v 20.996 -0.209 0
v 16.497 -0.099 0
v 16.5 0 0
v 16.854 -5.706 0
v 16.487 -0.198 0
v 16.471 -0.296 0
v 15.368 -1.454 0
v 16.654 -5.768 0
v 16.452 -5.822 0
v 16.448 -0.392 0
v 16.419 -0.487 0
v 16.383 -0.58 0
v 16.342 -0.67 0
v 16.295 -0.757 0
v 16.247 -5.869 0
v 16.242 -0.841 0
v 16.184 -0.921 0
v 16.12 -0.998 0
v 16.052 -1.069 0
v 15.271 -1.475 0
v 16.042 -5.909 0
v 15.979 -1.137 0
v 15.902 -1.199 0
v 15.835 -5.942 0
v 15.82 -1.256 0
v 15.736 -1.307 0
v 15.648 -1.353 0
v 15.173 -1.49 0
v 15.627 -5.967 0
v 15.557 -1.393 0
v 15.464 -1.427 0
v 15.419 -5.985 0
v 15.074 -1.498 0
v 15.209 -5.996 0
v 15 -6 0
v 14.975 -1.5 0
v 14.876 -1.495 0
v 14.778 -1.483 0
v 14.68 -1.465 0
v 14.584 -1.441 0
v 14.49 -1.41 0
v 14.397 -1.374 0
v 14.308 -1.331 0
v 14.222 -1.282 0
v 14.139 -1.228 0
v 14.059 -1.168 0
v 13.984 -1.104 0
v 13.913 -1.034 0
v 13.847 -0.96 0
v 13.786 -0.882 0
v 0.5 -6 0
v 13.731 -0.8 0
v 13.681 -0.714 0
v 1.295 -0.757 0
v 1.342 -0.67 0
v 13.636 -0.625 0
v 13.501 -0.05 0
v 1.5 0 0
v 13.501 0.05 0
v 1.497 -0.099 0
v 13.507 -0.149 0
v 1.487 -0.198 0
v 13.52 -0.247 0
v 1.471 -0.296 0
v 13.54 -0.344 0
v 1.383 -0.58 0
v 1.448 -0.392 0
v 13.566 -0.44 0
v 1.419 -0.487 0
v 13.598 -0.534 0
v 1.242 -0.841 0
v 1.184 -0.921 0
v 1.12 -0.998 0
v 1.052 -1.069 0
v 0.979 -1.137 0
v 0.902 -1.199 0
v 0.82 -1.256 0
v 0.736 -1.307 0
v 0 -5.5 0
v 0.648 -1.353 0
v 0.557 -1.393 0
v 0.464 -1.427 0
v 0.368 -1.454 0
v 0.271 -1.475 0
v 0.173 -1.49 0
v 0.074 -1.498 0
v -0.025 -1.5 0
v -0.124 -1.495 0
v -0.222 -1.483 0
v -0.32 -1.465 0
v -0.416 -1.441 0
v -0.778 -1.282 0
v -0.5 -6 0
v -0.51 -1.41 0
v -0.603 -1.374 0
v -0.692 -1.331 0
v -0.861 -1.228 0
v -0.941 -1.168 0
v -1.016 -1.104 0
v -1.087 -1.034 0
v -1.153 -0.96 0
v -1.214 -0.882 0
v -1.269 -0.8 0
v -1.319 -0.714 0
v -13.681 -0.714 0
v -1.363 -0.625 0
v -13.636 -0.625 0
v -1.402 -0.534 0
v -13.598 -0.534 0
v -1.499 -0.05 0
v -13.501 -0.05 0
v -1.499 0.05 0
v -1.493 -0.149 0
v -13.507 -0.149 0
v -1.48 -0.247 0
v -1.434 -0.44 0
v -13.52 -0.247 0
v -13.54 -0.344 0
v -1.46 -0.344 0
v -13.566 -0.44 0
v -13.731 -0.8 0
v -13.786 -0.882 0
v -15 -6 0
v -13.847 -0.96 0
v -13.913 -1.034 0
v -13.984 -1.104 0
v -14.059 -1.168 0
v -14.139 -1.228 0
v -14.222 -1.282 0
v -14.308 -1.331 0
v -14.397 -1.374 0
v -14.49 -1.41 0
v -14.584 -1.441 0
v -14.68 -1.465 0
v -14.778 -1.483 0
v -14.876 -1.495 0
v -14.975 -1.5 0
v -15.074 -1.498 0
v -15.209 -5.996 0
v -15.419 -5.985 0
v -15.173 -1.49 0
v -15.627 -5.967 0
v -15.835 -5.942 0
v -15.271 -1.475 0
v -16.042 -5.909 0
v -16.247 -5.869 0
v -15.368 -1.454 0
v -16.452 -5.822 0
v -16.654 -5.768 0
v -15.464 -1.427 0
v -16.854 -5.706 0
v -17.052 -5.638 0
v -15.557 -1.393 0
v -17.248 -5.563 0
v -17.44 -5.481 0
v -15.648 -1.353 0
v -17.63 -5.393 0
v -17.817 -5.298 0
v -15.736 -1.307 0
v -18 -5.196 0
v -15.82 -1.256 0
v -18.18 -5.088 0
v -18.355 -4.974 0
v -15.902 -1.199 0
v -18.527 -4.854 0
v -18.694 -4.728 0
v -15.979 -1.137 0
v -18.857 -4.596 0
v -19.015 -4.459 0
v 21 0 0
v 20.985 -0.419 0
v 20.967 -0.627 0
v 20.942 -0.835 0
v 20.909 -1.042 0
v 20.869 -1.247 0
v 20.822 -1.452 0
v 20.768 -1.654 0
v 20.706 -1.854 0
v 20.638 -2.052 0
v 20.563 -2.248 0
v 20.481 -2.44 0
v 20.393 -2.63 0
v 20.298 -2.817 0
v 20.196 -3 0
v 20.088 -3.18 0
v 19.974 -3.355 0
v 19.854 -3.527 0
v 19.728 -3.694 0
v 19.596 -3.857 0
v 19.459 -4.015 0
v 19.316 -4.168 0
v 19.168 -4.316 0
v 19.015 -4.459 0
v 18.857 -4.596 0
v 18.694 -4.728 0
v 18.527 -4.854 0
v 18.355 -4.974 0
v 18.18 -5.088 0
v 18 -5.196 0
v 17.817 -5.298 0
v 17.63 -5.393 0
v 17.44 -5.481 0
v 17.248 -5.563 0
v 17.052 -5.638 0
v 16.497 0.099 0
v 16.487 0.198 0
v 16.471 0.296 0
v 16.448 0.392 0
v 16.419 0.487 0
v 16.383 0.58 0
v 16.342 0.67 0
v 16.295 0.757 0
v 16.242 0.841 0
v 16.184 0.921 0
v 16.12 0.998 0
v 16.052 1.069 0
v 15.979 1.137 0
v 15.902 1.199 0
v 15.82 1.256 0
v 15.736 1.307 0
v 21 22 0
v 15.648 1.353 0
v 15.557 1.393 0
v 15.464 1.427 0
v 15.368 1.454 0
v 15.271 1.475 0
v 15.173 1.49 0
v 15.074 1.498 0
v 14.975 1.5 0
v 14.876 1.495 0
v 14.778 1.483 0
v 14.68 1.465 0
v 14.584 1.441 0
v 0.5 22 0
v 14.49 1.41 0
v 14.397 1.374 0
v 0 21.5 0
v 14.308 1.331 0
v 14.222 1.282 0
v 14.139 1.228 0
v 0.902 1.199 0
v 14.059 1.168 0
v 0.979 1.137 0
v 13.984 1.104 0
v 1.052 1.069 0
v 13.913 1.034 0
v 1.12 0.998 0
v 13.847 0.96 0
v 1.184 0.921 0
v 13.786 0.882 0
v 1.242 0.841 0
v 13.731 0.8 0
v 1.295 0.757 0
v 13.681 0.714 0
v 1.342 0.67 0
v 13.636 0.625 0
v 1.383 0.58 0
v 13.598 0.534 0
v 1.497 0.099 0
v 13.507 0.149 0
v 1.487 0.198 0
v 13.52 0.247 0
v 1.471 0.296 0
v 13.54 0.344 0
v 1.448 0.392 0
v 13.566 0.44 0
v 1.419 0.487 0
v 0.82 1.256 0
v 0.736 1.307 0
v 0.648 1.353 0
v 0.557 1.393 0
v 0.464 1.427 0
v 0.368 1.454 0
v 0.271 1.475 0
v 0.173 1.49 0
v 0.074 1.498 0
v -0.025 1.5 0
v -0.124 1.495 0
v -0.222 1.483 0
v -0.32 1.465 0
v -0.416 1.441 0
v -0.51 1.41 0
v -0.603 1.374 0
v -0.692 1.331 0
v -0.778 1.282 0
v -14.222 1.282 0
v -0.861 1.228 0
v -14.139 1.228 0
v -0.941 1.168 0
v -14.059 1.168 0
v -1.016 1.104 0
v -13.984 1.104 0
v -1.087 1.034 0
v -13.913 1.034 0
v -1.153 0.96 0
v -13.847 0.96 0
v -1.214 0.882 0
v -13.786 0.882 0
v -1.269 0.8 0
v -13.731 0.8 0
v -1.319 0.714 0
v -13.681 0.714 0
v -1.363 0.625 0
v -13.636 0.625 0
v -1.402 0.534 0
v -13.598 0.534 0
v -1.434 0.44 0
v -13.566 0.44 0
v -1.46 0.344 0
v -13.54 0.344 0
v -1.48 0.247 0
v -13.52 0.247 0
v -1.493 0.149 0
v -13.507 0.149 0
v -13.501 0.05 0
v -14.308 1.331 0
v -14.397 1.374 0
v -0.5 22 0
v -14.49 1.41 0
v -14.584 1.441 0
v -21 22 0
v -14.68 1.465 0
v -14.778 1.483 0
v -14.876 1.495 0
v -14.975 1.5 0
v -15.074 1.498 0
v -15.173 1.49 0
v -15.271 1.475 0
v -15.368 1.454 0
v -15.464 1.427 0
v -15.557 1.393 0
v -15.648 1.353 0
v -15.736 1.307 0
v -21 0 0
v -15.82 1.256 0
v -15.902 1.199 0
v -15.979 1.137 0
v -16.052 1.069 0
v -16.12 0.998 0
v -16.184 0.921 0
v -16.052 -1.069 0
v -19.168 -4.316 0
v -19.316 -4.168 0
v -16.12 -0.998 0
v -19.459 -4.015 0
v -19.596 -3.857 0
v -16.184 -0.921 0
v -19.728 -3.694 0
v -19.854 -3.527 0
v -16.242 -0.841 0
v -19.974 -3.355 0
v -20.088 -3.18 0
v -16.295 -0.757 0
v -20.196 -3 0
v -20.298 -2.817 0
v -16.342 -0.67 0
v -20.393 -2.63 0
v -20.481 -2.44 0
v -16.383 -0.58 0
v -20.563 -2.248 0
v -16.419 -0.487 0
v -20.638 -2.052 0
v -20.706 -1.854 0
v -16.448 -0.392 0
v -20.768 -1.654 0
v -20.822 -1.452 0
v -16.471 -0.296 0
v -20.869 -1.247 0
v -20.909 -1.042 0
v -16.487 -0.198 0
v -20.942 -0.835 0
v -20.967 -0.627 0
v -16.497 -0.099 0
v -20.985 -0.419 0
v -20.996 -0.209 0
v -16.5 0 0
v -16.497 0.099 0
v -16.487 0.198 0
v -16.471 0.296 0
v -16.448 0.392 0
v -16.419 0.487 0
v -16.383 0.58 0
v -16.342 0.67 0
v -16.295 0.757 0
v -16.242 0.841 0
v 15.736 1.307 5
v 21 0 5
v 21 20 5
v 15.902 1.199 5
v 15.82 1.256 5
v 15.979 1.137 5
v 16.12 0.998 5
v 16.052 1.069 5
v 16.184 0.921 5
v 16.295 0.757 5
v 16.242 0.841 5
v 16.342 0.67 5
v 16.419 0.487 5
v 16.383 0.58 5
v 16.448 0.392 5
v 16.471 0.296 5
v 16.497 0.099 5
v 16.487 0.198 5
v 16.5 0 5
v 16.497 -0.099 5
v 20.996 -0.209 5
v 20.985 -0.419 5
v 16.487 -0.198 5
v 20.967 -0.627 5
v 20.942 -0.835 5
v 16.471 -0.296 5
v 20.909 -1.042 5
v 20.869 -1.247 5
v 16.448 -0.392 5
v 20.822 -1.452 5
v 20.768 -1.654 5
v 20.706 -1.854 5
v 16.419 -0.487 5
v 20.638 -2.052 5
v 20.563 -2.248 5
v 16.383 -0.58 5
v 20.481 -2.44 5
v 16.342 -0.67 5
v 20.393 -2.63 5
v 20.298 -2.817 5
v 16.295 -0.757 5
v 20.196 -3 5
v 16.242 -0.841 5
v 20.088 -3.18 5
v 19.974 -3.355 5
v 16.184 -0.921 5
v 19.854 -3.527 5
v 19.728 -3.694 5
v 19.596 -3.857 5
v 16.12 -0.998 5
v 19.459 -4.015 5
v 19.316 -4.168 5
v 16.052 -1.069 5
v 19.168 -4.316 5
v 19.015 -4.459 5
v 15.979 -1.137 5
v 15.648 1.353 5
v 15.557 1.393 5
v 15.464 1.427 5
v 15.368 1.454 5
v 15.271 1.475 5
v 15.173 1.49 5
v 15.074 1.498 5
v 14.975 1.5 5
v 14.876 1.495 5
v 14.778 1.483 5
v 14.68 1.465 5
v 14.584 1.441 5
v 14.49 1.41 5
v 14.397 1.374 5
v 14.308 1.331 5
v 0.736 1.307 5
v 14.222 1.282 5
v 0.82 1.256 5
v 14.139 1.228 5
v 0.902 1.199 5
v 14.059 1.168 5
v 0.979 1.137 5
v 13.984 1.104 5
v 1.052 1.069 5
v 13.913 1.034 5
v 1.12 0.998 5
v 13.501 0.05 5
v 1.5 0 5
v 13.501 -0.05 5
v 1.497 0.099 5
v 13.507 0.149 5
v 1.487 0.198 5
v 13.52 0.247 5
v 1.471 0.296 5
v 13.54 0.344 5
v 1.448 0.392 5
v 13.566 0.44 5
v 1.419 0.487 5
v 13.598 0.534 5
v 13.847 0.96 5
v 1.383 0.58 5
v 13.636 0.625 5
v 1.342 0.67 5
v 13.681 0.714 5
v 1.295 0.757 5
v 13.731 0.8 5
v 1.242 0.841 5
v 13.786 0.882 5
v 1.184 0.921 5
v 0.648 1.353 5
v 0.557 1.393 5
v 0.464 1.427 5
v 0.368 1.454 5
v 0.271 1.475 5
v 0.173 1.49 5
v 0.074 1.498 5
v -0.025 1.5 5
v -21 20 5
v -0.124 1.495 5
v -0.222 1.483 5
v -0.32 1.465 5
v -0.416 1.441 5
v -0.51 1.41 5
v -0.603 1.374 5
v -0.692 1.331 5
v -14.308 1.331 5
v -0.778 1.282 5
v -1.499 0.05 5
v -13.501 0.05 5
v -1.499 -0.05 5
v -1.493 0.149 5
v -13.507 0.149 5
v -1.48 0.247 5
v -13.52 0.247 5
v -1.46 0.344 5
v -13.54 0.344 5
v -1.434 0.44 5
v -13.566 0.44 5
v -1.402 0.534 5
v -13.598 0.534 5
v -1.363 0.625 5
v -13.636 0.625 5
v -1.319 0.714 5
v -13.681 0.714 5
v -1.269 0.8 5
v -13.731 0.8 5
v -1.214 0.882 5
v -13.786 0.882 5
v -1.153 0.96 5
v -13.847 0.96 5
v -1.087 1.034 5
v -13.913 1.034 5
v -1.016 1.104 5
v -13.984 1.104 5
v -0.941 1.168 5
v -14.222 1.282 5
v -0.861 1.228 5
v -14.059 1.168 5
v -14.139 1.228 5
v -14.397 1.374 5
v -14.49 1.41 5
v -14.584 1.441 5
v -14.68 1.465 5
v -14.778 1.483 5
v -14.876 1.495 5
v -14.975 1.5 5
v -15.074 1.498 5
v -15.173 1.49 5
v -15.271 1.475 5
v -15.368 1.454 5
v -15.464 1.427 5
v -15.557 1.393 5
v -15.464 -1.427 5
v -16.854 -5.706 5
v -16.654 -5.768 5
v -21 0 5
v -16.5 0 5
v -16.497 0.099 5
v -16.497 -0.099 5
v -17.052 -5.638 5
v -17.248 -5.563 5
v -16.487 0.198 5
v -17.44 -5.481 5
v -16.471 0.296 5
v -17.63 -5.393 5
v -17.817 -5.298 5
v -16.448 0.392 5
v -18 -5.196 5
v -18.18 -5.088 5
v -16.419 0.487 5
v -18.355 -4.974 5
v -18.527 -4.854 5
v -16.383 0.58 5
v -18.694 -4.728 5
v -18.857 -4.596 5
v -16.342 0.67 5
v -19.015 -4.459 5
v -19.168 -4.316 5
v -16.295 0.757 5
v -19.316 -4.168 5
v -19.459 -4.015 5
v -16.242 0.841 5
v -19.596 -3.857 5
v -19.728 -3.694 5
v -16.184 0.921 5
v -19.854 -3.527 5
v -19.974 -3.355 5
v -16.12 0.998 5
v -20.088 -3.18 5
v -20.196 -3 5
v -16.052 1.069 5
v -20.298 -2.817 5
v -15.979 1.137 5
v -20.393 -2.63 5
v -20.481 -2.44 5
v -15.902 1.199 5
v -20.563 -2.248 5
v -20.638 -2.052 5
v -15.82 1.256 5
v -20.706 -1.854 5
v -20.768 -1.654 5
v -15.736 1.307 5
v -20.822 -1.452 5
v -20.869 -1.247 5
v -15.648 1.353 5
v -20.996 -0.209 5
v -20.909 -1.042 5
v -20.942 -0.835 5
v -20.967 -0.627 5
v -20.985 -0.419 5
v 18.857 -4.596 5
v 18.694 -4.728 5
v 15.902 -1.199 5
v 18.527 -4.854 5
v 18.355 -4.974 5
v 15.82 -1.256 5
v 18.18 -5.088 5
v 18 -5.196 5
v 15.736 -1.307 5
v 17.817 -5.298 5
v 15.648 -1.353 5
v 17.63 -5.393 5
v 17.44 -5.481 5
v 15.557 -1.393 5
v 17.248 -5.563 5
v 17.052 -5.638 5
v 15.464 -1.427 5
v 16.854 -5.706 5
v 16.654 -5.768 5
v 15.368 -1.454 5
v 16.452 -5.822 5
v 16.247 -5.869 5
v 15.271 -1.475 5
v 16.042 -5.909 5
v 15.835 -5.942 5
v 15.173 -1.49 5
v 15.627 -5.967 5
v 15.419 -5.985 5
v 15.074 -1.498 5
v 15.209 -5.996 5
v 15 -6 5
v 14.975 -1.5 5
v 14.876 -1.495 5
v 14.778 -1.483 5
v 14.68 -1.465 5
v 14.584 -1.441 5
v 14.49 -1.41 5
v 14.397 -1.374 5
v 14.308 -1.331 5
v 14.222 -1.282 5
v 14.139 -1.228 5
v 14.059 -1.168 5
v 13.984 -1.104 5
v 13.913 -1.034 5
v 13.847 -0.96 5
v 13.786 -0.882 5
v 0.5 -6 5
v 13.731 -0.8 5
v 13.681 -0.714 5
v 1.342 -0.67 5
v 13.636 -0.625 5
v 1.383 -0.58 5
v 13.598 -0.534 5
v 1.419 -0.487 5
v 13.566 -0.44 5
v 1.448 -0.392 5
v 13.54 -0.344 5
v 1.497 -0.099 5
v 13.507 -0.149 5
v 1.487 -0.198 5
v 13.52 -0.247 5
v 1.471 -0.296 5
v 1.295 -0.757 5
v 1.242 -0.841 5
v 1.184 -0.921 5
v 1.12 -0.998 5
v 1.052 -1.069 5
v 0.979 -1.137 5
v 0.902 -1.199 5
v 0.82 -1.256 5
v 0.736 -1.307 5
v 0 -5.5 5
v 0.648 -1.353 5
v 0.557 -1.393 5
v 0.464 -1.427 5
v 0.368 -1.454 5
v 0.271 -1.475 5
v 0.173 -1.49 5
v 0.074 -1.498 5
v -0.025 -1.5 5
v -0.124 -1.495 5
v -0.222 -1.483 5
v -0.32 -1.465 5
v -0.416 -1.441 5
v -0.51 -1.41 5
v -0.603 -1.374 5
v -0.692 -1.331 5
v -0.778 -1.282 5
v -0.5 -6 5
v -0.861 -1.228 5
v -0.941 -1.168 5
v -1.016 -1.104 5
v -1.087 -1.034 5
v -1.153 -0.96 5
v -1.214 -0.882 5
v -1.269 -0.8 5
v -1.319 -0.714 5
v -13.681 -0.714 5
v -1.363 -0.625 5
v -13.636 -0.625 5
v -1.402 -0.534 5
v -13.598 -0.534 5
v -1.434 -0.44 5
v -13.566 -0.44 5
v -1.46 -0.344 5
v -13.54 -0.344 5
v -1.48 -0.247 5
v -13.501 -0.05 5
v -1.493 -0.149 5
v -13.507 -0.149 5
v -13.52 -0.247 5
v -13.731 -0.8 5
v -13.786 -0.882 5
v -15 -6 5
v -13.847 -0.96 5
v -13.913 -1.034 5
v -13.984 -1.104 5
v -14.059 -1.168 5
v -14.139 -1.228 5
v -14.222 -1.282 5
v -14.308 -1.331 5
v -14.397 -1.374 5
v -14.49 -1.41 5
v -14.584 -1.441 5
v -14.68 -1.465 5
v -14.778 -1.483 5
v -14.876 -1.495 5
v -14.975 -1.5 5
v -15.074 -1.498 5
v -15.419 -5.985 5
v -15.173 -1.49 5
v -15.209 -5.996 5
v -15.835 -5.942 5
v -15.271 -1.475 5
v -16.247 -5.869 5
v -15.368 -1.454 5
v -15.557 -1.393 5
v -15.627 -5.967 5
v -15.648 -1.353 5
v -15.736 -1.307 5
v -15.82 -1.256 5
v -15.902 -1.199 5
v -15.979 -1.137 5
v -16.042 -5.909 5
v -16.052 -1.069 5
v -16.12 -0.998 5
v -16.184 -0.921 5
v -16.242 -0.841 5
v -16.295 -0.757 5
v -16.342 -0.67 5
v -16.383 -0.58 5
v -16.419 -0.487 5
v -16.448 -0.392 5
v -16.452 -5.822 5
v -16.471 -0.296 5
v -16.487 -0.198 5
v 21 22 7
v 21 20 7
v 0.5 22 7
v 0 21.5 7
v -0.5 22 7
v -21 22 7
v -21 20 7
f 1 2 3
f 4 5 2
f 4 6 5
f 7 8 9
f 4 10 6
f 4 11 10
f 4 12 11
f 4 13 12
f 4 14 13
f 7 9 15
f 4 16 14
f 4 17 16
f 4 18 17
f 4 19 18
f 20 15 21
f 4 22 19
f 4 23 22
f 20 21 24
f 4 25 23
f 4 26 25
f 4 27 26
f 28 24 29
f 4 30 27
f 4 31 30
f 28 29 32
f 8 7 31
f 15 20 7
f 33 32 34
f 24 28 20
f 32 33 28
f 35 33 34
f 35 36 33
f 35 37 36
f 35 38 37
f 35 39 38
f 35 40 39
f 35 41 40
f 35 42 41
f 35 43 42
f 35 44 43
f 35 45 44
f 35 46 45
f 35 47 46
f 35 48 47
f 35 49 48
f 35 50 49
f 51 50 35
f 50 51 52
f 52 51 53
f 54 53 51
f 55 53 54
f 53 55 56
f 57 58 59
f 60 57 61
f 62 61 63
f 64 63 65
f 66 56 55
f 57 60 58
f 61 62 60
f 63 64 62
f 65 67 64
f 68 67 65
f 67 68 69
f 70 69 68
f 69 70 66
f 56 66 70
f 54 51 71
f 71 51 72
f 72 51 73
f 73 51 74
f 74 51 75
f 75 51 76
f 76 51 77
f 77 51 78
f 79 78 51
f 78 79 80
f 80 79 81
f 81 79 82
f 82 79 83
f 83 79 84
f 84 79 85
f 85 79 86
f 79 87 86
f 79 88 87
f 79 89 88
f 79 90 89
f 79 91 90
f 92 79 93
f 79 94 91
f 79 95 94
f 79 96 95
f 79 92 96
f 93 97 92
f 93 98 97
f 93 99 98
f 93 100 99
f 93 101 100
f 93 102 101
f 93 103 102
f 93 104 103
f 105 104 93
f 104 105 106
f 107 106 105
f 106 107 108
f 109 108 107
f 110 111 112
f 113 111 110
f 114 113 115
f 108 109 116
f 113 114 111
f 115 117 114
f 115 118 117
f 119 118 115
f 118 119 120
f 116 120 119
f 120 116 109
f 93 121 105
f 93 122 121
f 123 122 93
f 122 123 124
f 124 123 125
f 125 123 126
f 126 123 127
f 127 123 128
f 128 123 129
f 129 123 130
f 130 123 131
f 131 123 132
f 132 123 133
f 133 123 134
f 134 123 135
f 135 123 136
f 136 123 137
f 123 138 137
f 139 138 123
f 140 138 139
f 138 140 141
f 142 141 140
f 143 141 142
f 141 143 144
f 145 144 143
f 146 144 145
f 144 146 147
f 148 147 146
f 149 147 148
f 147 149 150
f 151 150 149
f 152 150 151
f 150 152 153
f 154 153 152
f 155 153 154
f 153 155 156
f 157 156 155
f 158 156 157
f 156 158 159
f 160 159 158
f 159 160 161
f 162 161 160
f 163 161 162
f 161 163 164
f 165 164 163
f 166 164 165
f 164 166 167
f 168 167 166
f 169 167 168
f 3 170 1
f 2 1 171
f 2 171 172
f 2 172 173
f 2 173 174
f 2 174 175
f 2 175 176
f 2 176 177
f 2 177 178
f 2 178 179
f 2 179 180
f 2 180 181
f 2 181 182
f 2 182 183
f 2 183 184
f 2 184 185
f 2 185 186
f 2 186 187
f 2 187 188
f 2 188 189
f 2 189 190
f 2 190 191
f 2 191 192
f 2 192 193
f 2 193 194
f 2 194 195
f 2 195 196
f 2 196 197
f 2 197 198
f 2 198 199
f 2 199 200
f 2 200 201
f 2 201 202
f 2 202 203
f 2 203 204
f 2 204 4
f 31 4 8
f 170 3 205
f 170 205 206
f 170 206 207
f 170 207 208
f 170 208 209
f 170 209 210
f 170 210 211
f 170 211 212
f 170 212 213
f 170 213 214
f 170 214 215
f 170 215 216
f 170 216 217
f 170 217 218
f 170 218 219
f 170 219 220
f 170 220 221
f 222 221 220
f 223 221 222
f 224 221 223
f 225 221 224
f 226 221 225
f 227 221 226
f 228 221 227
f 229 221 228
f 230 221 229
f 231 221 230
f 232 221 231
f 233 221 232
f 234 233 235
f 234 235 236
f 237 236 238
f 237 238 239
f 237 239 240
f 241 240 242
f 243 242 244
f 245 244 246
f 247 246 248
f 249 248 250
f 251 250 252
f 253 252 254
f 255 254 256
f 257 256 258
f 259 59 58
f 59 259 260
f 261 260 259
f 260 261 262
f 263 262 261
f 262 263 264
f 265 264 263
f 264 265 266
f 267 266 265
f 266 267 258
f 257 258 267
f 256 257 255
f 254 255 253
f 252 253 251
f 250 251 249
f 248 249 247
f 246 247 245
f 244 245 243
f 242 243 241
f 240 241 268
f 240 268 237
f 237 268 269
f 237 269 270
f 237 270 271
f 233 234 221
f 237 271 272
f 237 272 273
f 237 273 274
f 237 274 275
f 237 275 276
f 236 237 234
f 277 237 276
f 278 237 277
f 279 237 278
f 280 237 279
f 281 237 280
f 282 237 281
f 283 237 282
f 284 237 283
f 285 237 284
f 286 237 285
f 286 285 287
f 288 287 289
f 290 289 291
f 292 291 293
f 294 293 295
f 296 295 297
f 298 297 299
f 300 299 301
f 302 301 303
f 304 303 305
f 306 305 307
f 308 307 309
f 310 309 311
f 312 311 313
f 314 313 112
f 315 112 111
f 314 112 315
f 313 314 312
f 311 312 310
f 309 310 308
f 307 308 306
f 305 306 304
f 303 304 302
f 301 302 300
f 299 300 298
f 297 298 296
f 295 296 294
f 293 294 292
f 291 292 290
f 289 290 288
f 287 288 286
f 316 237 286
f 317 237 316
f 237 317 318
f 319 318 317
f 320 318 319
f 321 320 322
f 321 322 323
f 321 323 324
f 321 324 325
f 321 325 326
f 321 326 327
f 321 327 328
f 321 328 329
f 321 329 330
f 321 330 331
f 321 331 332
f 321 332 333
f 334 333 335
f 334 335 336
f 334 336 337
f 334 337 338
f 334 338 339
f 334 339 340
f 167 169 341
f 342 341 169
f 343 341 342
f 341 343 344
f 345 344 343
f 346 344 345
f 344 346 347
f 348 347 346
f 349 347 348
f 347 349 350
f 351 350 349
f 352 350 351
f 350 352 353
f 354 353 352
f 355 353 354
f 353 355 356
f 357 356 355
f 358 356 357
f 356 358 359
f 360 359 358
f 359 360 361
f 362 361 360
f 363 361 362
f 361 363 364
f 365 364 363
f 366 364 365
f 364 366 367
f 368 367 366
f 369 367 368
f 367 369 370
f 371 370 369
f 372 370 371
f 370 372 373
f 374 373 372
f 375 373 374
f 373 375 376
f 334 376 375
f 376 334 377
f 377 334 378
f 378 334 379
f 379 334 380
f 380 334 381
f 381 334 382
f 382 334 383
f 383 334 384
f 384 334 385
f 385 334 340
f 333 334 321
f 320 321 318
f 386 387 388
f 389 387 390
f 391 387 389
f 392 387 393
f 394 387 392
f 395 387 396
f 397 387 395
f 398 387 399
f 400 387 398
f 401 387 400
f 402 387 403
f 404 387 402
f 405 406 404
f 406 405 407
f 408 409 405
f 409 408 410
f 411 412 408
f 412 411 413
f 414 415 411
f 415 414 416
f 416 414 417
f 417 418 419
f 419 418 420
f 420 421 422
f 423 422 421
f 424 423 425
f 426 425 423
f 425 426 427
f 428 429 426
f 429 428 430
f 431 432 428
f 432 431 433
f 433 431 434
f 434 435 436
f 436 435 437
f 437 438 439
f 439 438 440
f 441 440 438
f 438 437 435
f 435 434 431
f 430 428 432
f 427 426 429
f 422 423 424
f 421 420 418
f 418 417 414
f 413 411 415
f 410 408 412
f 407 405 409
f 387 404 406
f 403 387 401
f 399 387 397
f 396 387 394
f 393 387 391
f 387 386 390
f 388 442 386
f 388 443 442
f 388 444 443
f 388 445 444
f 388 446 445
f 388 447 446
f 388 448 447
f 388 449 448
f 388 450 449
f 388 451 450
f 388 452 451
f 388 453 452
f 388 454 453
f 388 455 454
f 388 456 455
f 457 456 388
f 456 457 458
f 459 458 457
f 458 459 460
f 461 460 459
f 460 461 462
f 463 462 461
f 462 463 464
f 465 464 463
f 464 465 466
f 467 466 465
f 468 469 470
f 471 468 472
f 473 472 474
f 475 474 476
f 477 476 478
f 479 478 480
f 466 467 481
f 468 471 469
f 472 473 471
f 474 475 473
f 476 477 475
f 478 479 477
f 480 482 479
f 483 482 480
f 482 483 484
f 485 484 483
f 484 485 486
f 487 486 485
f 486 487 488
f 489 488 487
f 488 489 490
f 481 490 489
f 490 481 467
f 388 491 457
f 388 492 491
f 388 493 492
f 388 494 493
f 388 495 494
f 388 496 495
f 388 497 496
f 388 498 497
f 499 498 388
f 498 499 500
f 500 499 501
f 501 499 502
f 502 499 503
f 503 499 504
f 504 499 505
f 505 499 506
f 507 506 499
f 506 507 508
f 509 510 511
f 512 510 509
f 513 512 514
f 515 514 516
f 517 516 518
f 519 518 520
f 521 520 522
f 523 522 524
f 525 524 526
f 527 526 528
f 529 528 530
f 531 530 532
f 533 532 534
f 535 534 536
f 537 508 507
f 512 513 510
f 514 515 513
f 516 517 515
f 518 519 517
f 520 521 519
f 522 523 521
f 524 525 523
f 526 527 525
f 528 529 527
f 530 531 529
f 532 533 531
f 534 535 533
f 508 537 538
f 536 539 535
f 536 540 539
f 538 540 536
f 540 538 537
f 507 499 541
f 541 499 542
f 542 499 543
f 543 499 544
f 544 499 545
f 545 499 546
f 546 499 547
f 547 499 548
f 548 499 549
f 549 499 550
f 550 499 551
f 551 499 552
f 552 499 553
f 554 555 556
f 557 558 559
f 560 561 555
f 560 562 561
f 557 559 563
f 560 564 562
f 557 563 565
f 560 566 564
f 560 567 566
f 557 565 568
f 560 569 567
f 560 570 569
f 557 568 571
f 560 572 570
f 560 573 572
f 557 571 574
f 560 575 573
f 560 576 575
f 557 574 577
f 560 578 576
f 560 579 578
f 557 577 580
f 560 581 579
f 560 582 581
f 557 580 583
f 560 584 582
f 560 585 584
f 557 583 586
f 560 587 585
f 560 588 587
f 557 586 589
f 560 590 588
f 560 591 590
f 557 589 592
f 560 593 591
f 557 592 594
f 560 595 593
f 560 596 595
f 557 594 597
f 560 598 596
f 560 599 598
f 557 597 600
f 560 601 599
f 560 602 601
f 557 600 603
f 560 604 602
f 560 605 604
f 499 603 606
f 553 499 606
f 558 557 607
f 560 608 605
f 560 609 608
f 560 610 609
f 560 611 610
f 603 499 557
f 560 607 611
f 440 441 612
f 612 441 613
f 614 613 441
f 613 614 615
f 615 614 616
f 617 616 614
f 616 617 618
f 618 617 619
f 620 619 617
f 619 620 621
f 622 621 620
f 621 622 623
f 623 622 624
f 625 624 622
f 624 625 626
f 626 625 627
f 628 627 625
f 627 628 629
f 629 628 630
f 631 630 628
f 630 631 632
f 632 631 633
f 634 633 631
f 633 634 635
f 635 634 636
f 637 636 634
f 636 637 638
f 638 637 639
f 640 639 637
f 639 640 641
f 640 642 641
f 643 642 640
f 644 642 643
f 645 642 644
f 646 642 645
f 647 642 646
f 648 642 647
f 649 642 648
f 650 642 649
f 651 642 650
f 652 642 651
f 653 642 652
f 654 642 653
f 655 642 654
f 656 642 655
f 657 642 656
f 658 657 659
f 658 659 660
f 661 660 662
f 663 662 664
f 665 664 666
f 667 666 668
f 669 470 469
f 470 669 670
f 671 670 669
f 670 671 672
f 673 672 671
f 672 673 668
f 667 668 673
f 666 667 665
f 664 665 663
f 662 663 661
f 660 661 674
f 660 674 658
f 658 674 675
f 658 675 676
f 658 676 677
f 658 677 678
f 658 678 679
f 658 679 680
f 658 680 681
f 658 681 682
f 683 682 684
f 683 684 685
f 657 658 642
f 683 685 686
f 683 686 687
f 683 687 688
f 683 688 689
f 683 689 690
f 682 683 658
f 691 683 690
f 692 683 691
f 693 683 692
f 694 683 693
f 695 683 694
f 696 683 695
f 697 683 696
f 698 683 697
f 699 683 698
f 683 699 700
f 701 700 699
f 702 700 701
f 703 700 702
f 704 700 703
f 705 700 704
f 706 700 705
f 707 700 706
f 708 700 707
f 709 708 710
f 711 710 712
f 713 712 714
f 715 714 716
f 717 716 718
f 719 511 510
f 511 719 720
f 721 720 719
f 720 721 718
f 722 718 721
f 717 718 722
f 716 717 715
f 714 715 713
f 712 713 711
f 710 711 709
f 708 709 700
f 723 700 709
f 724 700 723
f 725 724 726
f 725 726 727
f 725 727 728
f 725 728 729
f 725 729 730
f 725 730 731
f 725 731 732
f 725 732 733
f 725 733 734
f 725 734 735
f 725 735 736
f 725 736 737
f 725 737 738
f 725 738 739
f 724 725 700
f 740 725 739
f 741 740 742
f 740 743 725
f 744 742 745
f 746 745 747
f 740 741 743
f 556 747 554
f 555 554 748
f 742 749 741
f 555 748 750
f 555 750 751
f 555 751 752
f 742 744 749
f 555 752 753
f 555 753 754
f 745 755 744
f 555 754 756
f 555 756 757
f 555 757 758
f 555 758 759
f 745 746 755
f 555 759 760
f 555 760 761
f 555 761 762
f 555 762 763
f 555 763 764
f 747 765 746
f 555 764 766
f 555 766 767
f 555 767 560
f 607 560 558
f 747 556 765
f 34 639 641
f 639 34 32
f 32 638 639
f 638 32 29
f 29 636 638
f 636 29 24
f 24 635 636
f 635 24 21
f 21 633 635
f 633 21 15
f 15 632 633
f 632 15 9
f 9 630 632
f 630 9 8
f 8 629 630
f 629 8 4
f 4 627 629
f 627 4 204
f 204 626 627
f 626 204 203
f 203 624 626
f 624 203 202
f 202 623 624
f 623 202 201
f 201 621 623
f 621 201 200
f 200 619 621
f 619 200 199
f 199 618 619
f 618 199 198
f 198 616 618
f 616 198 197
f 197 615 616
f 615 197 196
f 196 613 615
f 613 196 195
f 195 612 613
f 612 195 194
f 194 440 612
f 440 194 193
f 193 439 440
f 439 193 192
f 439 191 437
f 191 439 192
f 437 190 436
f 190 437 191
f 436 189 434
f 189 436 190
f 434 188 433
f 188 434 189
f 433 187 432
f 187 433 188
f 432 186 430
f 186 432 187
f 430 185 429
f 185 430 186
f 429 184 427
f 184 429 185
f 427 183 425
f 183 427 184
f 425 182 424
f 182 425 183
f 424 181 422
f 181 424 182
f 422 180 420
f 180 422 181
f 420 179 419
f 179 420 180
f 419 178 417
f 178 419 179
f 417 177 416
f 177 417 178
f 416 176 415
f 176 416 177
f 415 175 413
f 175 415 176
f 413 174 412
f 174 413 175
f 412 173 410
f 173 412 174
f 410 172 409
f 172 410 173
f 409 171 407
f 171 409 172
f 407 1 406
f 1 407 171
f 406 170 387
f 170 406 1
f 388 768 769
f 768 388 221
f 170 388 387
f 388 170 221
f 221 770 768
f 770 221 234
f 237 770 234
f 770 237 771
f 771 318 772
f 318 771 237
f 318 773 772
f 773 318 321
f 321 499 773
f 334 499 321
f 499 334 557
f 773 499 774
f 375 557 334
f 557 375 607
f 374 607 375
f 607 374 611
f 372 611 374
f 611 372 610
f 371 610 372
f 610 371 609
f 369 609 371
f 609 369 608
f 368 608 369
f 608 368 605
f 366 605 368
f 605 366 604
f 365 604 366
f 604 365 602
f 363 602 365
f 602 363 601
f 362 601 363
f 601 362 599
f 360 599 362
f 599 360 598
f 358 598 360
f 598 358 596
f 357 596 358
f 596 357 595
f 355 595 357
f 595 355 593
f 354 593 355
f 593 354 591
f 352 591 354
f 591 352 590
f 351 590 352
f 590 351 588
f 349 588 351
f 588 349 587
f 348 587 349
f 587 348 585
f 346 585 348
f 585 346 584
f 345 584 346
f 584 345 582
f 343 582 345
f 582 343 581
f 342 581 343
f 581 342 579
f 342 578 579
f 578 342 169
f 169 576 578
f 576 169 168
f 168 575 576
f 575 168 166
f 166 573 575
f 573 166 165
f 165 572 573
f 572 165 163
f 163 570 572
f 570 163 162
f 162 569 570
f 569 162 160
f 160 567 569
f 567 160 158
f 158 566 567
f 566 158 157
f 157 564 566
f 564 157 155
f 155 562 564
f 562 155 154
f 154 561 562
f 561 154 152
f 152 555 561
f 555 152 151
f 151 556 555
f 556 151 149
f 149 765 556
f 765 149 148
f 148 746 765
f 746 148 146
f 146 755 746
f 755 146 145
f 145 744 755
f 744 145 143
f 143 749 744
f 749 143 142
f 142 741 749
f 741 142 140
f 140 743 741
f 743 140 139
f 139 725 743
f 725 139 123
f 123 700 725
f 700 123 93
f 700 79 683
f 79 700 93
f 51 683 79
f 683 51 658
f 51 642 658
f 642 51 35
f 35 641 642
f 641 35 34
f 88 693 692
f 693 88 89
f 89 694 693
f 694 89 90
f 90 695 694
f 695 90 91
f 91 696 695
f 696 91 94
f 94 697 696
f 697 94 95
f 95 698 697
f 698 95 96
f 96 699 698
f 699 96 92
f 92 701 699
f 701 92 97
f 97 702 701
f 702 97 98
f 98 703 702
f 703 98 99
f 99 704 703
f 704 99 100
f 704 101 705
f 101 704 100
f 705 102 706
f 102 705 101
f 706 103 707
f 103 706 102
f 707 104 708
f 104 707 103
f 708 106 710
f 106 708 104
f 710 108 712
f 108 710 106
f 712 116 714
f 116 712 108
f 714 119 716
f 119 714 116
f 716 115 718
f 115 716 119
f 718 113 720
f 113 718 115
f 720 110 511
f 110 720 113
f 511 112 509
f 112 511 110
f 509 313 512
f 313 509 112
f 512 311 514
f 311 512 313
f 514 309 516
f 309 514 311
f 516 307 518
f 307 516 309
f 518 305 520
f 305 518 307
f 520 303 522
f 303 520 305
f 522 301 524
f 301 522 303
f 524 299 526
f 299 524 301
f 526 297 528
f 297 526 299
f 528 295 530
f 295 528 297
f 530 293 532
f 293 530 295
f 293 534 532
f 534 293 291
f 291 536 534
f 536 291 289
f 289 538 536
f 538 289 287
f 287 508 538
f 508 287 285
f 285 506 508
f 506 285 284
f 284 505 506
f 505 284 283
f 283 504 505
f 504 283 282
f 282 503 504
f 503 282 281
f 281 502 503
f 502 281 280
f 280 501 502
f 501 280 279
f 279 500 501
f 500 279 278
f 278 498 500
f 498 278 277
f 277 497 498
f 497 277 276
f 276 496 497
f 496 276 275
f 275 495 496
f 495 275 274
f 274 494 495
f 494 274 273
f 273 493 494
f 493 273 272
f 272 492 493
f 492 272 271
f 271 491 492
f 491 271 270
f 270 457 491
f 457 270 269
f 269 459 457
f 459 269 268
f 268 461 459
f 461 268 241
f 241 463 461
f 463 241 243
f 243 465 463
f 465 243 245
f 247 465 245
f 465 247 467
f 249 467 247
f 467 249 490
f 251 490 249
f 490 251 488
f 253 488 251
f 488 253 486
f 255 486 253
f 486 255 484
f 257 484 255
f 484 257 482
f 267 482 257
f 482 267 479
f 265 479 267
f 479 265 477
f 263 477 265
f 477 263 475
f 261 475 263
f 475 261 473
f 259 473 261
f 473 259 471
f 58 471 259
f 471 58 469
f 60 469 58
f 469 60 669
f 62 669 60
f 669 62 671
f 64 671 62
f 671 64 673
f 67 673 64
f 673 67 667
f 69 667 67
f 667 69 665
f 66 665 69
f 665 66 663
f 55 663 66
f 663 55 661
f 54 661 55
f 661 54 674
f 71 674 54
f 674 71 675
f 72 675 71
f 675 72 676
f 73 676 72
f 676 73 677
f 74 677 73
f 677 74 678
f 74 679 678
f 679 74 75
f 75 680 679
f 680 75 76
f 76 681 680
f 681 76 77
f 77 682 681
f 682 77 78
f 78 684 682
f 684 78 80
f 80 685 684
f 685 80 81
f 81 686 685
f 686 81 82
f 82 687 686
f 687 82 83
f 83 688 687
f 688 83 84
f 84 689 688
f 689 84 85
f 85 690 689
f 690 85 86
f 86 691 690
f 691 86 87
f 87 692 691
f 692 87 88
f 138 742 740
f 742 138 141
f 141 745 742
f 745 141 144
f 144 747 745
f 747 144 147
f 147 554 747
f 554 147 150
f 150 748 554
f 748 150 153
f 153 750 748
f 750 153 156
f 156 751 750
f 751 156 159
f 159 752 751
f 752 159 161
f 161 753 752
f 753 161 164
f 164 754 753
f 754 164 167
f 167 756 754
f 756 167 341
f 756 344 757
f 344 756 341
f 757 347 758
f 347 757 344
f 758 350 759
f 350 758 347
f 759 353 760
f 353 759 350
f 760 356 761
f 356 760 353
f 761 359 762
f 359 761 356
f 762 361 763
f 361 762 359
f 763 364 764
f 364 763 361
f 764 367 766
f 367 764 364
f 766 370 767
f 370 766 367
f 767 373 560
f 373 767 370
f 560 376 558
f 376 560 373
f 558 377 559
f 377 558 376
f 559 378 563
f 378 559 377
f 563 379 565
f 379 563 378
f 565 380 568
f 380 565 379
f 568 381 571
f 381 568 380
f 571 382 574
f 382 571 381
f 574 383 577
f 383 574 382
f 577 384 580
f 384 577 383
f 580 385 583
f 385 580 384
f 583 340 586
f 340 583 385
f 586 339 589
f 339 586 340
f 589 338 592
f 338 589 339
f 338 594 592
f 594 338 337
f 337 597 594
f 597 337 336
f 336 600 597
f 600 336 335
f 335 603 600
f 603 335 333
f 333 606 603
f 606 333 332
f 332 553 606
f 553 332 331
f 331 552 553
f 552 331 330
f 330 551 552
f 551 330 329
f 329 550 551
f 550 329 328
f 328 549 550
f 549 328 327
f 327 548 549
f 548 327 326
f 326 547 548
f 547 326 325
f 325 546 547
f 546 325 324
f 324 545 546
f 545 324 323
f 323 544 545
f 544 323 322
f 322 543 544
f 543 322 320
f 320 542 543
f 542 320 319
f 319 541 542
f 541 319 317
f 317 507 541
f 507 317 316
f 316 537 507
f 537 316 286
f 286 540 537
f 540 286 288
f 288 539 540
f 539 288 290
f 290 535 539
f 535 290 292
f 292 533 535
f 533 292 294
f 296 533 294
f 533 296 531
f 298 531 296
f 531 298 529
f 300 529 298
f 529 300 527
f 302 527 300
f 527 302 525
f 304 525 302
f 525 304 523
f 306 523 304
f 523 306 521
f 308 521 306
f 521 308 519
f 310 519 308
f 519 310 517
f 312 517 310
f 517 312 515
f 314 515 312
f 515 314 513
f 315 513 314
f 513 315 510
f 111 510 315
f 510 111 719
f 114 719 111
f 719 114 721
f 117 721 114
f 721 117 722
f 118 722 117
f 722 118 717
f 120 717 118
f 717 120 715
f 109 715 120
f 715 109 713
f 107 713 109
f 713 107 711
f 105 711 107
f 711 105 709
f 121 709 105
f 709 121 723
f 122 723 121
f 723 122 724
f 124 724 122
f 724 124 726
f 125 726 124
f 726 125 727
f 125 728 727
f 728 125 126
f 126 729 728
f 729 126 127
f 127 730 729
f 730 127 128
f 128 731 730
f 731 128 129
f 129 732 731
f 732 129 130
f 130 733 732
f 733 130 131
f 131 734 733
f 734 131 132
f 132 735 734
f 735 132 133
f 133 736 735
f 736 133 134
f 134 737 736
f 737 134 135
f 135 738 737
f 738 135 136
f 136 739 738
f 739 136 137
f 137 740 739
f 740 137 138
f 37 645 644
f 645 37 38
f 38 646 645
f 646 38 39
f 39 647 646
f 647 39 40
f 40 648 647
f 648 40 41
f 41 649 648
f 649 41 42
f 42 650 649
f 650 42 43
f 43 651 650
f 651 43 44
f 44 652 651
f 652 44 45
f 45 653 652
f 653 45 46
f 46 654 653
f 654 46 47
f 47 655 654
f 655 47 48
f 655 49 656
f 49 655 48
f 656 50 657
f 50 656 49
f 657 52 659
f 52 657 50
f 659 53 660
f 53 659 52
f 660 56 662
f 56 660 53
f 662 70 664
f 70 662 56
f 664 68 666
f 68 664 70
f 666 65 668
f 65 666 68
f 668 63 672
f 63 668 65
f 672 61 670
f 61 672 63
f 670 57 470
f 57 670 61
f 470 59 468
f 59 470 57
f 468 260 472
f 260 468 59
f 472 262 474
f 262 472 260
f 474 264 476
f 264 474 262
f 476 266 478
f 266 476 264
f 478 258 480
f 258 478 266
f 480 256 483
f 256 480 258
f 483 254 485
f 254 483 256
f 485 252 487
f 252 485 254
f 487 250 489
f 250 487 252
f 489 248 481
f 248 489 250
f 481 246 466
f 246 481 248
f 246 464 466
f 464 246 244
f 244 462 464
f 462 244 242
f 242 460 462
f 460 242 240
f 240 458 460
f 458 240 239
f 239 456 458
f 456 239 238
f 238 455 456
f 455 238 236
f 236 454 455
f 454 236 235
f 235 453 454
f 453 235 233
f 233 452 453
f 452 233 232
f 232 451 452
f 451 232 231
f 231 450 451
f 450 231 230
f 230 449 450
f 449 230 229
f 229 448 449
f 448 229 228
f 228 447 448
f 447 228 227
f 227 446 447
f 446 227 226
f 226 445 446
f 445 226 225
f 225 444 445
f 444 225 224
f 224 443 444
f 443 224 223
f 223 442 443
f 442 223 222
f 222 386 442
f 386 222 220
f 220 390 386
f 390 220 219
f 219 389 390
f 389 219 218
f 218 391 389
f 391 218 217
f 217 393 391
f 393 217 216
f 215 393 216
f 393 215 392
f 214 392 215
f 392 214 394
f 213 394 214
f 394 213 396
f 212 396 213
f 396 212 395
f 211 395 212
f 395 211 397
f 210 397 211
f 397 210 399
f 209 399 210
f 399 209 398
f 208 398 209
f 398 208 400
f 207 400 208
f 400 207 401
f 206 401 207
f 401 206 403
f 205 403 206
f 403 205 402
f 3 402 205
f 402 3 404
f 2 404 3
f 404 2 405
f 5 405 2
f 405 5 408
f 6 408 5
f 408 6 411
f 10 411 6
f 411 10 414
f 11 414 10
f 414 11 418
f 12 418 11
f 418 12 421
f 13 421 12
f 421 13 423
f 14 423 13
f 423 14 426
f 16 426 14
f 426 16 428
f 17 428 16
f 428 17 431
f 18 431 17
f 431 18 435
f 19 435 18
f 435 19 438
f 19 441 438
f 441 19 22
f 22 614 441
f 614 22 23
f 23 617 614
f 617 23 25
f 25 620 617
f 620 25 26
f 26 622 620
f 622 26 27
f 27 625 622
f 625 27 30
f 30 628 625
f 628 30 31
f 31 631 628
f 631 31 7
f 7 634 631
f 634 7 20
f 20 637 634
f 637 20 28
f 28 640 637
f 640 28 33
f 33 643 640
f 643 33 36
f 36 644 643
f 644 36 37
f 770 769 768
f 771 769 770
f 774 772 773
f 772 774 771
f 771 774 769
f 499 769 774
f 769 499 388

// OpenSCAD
$fs = $preview ? 1 : 0.1;
$fa = $preview ? 3 : 2;

// Mounting holes
mh_sep = 30; // separation
mh_dia = 3; // diameter

lip = 2;
distance_from_edge = 20;
margin = 6;
thickness = 5;

width = mh_sep + margin * 2;

module lip() {
  translate([-width / 2, distance_from_edge])
    square([width, lip]);
}

module mounting_holes(r) {
  circle(r = r);
  for (k = [-1, 1])
    scale([k, 1])
      translate([mh_sep / 2, 0])
        circle(r = r);
}

module alignment() {
  for (y = [distance_from_edge + lip, -margin])
    translate([0, y])
      circle(r = 0.5, $fn = 4);
}

linear_extrude(thickness) {
  difference() {
    hull() {
      mounting_holes(r = margin);
      lip();
    }
    mounting_holes(r = mh_dia / 2);
    alignment();
  }
}

linear_extrude(thickness + lip) {
  difference() {
    lip();
    alignment();
  }
}
